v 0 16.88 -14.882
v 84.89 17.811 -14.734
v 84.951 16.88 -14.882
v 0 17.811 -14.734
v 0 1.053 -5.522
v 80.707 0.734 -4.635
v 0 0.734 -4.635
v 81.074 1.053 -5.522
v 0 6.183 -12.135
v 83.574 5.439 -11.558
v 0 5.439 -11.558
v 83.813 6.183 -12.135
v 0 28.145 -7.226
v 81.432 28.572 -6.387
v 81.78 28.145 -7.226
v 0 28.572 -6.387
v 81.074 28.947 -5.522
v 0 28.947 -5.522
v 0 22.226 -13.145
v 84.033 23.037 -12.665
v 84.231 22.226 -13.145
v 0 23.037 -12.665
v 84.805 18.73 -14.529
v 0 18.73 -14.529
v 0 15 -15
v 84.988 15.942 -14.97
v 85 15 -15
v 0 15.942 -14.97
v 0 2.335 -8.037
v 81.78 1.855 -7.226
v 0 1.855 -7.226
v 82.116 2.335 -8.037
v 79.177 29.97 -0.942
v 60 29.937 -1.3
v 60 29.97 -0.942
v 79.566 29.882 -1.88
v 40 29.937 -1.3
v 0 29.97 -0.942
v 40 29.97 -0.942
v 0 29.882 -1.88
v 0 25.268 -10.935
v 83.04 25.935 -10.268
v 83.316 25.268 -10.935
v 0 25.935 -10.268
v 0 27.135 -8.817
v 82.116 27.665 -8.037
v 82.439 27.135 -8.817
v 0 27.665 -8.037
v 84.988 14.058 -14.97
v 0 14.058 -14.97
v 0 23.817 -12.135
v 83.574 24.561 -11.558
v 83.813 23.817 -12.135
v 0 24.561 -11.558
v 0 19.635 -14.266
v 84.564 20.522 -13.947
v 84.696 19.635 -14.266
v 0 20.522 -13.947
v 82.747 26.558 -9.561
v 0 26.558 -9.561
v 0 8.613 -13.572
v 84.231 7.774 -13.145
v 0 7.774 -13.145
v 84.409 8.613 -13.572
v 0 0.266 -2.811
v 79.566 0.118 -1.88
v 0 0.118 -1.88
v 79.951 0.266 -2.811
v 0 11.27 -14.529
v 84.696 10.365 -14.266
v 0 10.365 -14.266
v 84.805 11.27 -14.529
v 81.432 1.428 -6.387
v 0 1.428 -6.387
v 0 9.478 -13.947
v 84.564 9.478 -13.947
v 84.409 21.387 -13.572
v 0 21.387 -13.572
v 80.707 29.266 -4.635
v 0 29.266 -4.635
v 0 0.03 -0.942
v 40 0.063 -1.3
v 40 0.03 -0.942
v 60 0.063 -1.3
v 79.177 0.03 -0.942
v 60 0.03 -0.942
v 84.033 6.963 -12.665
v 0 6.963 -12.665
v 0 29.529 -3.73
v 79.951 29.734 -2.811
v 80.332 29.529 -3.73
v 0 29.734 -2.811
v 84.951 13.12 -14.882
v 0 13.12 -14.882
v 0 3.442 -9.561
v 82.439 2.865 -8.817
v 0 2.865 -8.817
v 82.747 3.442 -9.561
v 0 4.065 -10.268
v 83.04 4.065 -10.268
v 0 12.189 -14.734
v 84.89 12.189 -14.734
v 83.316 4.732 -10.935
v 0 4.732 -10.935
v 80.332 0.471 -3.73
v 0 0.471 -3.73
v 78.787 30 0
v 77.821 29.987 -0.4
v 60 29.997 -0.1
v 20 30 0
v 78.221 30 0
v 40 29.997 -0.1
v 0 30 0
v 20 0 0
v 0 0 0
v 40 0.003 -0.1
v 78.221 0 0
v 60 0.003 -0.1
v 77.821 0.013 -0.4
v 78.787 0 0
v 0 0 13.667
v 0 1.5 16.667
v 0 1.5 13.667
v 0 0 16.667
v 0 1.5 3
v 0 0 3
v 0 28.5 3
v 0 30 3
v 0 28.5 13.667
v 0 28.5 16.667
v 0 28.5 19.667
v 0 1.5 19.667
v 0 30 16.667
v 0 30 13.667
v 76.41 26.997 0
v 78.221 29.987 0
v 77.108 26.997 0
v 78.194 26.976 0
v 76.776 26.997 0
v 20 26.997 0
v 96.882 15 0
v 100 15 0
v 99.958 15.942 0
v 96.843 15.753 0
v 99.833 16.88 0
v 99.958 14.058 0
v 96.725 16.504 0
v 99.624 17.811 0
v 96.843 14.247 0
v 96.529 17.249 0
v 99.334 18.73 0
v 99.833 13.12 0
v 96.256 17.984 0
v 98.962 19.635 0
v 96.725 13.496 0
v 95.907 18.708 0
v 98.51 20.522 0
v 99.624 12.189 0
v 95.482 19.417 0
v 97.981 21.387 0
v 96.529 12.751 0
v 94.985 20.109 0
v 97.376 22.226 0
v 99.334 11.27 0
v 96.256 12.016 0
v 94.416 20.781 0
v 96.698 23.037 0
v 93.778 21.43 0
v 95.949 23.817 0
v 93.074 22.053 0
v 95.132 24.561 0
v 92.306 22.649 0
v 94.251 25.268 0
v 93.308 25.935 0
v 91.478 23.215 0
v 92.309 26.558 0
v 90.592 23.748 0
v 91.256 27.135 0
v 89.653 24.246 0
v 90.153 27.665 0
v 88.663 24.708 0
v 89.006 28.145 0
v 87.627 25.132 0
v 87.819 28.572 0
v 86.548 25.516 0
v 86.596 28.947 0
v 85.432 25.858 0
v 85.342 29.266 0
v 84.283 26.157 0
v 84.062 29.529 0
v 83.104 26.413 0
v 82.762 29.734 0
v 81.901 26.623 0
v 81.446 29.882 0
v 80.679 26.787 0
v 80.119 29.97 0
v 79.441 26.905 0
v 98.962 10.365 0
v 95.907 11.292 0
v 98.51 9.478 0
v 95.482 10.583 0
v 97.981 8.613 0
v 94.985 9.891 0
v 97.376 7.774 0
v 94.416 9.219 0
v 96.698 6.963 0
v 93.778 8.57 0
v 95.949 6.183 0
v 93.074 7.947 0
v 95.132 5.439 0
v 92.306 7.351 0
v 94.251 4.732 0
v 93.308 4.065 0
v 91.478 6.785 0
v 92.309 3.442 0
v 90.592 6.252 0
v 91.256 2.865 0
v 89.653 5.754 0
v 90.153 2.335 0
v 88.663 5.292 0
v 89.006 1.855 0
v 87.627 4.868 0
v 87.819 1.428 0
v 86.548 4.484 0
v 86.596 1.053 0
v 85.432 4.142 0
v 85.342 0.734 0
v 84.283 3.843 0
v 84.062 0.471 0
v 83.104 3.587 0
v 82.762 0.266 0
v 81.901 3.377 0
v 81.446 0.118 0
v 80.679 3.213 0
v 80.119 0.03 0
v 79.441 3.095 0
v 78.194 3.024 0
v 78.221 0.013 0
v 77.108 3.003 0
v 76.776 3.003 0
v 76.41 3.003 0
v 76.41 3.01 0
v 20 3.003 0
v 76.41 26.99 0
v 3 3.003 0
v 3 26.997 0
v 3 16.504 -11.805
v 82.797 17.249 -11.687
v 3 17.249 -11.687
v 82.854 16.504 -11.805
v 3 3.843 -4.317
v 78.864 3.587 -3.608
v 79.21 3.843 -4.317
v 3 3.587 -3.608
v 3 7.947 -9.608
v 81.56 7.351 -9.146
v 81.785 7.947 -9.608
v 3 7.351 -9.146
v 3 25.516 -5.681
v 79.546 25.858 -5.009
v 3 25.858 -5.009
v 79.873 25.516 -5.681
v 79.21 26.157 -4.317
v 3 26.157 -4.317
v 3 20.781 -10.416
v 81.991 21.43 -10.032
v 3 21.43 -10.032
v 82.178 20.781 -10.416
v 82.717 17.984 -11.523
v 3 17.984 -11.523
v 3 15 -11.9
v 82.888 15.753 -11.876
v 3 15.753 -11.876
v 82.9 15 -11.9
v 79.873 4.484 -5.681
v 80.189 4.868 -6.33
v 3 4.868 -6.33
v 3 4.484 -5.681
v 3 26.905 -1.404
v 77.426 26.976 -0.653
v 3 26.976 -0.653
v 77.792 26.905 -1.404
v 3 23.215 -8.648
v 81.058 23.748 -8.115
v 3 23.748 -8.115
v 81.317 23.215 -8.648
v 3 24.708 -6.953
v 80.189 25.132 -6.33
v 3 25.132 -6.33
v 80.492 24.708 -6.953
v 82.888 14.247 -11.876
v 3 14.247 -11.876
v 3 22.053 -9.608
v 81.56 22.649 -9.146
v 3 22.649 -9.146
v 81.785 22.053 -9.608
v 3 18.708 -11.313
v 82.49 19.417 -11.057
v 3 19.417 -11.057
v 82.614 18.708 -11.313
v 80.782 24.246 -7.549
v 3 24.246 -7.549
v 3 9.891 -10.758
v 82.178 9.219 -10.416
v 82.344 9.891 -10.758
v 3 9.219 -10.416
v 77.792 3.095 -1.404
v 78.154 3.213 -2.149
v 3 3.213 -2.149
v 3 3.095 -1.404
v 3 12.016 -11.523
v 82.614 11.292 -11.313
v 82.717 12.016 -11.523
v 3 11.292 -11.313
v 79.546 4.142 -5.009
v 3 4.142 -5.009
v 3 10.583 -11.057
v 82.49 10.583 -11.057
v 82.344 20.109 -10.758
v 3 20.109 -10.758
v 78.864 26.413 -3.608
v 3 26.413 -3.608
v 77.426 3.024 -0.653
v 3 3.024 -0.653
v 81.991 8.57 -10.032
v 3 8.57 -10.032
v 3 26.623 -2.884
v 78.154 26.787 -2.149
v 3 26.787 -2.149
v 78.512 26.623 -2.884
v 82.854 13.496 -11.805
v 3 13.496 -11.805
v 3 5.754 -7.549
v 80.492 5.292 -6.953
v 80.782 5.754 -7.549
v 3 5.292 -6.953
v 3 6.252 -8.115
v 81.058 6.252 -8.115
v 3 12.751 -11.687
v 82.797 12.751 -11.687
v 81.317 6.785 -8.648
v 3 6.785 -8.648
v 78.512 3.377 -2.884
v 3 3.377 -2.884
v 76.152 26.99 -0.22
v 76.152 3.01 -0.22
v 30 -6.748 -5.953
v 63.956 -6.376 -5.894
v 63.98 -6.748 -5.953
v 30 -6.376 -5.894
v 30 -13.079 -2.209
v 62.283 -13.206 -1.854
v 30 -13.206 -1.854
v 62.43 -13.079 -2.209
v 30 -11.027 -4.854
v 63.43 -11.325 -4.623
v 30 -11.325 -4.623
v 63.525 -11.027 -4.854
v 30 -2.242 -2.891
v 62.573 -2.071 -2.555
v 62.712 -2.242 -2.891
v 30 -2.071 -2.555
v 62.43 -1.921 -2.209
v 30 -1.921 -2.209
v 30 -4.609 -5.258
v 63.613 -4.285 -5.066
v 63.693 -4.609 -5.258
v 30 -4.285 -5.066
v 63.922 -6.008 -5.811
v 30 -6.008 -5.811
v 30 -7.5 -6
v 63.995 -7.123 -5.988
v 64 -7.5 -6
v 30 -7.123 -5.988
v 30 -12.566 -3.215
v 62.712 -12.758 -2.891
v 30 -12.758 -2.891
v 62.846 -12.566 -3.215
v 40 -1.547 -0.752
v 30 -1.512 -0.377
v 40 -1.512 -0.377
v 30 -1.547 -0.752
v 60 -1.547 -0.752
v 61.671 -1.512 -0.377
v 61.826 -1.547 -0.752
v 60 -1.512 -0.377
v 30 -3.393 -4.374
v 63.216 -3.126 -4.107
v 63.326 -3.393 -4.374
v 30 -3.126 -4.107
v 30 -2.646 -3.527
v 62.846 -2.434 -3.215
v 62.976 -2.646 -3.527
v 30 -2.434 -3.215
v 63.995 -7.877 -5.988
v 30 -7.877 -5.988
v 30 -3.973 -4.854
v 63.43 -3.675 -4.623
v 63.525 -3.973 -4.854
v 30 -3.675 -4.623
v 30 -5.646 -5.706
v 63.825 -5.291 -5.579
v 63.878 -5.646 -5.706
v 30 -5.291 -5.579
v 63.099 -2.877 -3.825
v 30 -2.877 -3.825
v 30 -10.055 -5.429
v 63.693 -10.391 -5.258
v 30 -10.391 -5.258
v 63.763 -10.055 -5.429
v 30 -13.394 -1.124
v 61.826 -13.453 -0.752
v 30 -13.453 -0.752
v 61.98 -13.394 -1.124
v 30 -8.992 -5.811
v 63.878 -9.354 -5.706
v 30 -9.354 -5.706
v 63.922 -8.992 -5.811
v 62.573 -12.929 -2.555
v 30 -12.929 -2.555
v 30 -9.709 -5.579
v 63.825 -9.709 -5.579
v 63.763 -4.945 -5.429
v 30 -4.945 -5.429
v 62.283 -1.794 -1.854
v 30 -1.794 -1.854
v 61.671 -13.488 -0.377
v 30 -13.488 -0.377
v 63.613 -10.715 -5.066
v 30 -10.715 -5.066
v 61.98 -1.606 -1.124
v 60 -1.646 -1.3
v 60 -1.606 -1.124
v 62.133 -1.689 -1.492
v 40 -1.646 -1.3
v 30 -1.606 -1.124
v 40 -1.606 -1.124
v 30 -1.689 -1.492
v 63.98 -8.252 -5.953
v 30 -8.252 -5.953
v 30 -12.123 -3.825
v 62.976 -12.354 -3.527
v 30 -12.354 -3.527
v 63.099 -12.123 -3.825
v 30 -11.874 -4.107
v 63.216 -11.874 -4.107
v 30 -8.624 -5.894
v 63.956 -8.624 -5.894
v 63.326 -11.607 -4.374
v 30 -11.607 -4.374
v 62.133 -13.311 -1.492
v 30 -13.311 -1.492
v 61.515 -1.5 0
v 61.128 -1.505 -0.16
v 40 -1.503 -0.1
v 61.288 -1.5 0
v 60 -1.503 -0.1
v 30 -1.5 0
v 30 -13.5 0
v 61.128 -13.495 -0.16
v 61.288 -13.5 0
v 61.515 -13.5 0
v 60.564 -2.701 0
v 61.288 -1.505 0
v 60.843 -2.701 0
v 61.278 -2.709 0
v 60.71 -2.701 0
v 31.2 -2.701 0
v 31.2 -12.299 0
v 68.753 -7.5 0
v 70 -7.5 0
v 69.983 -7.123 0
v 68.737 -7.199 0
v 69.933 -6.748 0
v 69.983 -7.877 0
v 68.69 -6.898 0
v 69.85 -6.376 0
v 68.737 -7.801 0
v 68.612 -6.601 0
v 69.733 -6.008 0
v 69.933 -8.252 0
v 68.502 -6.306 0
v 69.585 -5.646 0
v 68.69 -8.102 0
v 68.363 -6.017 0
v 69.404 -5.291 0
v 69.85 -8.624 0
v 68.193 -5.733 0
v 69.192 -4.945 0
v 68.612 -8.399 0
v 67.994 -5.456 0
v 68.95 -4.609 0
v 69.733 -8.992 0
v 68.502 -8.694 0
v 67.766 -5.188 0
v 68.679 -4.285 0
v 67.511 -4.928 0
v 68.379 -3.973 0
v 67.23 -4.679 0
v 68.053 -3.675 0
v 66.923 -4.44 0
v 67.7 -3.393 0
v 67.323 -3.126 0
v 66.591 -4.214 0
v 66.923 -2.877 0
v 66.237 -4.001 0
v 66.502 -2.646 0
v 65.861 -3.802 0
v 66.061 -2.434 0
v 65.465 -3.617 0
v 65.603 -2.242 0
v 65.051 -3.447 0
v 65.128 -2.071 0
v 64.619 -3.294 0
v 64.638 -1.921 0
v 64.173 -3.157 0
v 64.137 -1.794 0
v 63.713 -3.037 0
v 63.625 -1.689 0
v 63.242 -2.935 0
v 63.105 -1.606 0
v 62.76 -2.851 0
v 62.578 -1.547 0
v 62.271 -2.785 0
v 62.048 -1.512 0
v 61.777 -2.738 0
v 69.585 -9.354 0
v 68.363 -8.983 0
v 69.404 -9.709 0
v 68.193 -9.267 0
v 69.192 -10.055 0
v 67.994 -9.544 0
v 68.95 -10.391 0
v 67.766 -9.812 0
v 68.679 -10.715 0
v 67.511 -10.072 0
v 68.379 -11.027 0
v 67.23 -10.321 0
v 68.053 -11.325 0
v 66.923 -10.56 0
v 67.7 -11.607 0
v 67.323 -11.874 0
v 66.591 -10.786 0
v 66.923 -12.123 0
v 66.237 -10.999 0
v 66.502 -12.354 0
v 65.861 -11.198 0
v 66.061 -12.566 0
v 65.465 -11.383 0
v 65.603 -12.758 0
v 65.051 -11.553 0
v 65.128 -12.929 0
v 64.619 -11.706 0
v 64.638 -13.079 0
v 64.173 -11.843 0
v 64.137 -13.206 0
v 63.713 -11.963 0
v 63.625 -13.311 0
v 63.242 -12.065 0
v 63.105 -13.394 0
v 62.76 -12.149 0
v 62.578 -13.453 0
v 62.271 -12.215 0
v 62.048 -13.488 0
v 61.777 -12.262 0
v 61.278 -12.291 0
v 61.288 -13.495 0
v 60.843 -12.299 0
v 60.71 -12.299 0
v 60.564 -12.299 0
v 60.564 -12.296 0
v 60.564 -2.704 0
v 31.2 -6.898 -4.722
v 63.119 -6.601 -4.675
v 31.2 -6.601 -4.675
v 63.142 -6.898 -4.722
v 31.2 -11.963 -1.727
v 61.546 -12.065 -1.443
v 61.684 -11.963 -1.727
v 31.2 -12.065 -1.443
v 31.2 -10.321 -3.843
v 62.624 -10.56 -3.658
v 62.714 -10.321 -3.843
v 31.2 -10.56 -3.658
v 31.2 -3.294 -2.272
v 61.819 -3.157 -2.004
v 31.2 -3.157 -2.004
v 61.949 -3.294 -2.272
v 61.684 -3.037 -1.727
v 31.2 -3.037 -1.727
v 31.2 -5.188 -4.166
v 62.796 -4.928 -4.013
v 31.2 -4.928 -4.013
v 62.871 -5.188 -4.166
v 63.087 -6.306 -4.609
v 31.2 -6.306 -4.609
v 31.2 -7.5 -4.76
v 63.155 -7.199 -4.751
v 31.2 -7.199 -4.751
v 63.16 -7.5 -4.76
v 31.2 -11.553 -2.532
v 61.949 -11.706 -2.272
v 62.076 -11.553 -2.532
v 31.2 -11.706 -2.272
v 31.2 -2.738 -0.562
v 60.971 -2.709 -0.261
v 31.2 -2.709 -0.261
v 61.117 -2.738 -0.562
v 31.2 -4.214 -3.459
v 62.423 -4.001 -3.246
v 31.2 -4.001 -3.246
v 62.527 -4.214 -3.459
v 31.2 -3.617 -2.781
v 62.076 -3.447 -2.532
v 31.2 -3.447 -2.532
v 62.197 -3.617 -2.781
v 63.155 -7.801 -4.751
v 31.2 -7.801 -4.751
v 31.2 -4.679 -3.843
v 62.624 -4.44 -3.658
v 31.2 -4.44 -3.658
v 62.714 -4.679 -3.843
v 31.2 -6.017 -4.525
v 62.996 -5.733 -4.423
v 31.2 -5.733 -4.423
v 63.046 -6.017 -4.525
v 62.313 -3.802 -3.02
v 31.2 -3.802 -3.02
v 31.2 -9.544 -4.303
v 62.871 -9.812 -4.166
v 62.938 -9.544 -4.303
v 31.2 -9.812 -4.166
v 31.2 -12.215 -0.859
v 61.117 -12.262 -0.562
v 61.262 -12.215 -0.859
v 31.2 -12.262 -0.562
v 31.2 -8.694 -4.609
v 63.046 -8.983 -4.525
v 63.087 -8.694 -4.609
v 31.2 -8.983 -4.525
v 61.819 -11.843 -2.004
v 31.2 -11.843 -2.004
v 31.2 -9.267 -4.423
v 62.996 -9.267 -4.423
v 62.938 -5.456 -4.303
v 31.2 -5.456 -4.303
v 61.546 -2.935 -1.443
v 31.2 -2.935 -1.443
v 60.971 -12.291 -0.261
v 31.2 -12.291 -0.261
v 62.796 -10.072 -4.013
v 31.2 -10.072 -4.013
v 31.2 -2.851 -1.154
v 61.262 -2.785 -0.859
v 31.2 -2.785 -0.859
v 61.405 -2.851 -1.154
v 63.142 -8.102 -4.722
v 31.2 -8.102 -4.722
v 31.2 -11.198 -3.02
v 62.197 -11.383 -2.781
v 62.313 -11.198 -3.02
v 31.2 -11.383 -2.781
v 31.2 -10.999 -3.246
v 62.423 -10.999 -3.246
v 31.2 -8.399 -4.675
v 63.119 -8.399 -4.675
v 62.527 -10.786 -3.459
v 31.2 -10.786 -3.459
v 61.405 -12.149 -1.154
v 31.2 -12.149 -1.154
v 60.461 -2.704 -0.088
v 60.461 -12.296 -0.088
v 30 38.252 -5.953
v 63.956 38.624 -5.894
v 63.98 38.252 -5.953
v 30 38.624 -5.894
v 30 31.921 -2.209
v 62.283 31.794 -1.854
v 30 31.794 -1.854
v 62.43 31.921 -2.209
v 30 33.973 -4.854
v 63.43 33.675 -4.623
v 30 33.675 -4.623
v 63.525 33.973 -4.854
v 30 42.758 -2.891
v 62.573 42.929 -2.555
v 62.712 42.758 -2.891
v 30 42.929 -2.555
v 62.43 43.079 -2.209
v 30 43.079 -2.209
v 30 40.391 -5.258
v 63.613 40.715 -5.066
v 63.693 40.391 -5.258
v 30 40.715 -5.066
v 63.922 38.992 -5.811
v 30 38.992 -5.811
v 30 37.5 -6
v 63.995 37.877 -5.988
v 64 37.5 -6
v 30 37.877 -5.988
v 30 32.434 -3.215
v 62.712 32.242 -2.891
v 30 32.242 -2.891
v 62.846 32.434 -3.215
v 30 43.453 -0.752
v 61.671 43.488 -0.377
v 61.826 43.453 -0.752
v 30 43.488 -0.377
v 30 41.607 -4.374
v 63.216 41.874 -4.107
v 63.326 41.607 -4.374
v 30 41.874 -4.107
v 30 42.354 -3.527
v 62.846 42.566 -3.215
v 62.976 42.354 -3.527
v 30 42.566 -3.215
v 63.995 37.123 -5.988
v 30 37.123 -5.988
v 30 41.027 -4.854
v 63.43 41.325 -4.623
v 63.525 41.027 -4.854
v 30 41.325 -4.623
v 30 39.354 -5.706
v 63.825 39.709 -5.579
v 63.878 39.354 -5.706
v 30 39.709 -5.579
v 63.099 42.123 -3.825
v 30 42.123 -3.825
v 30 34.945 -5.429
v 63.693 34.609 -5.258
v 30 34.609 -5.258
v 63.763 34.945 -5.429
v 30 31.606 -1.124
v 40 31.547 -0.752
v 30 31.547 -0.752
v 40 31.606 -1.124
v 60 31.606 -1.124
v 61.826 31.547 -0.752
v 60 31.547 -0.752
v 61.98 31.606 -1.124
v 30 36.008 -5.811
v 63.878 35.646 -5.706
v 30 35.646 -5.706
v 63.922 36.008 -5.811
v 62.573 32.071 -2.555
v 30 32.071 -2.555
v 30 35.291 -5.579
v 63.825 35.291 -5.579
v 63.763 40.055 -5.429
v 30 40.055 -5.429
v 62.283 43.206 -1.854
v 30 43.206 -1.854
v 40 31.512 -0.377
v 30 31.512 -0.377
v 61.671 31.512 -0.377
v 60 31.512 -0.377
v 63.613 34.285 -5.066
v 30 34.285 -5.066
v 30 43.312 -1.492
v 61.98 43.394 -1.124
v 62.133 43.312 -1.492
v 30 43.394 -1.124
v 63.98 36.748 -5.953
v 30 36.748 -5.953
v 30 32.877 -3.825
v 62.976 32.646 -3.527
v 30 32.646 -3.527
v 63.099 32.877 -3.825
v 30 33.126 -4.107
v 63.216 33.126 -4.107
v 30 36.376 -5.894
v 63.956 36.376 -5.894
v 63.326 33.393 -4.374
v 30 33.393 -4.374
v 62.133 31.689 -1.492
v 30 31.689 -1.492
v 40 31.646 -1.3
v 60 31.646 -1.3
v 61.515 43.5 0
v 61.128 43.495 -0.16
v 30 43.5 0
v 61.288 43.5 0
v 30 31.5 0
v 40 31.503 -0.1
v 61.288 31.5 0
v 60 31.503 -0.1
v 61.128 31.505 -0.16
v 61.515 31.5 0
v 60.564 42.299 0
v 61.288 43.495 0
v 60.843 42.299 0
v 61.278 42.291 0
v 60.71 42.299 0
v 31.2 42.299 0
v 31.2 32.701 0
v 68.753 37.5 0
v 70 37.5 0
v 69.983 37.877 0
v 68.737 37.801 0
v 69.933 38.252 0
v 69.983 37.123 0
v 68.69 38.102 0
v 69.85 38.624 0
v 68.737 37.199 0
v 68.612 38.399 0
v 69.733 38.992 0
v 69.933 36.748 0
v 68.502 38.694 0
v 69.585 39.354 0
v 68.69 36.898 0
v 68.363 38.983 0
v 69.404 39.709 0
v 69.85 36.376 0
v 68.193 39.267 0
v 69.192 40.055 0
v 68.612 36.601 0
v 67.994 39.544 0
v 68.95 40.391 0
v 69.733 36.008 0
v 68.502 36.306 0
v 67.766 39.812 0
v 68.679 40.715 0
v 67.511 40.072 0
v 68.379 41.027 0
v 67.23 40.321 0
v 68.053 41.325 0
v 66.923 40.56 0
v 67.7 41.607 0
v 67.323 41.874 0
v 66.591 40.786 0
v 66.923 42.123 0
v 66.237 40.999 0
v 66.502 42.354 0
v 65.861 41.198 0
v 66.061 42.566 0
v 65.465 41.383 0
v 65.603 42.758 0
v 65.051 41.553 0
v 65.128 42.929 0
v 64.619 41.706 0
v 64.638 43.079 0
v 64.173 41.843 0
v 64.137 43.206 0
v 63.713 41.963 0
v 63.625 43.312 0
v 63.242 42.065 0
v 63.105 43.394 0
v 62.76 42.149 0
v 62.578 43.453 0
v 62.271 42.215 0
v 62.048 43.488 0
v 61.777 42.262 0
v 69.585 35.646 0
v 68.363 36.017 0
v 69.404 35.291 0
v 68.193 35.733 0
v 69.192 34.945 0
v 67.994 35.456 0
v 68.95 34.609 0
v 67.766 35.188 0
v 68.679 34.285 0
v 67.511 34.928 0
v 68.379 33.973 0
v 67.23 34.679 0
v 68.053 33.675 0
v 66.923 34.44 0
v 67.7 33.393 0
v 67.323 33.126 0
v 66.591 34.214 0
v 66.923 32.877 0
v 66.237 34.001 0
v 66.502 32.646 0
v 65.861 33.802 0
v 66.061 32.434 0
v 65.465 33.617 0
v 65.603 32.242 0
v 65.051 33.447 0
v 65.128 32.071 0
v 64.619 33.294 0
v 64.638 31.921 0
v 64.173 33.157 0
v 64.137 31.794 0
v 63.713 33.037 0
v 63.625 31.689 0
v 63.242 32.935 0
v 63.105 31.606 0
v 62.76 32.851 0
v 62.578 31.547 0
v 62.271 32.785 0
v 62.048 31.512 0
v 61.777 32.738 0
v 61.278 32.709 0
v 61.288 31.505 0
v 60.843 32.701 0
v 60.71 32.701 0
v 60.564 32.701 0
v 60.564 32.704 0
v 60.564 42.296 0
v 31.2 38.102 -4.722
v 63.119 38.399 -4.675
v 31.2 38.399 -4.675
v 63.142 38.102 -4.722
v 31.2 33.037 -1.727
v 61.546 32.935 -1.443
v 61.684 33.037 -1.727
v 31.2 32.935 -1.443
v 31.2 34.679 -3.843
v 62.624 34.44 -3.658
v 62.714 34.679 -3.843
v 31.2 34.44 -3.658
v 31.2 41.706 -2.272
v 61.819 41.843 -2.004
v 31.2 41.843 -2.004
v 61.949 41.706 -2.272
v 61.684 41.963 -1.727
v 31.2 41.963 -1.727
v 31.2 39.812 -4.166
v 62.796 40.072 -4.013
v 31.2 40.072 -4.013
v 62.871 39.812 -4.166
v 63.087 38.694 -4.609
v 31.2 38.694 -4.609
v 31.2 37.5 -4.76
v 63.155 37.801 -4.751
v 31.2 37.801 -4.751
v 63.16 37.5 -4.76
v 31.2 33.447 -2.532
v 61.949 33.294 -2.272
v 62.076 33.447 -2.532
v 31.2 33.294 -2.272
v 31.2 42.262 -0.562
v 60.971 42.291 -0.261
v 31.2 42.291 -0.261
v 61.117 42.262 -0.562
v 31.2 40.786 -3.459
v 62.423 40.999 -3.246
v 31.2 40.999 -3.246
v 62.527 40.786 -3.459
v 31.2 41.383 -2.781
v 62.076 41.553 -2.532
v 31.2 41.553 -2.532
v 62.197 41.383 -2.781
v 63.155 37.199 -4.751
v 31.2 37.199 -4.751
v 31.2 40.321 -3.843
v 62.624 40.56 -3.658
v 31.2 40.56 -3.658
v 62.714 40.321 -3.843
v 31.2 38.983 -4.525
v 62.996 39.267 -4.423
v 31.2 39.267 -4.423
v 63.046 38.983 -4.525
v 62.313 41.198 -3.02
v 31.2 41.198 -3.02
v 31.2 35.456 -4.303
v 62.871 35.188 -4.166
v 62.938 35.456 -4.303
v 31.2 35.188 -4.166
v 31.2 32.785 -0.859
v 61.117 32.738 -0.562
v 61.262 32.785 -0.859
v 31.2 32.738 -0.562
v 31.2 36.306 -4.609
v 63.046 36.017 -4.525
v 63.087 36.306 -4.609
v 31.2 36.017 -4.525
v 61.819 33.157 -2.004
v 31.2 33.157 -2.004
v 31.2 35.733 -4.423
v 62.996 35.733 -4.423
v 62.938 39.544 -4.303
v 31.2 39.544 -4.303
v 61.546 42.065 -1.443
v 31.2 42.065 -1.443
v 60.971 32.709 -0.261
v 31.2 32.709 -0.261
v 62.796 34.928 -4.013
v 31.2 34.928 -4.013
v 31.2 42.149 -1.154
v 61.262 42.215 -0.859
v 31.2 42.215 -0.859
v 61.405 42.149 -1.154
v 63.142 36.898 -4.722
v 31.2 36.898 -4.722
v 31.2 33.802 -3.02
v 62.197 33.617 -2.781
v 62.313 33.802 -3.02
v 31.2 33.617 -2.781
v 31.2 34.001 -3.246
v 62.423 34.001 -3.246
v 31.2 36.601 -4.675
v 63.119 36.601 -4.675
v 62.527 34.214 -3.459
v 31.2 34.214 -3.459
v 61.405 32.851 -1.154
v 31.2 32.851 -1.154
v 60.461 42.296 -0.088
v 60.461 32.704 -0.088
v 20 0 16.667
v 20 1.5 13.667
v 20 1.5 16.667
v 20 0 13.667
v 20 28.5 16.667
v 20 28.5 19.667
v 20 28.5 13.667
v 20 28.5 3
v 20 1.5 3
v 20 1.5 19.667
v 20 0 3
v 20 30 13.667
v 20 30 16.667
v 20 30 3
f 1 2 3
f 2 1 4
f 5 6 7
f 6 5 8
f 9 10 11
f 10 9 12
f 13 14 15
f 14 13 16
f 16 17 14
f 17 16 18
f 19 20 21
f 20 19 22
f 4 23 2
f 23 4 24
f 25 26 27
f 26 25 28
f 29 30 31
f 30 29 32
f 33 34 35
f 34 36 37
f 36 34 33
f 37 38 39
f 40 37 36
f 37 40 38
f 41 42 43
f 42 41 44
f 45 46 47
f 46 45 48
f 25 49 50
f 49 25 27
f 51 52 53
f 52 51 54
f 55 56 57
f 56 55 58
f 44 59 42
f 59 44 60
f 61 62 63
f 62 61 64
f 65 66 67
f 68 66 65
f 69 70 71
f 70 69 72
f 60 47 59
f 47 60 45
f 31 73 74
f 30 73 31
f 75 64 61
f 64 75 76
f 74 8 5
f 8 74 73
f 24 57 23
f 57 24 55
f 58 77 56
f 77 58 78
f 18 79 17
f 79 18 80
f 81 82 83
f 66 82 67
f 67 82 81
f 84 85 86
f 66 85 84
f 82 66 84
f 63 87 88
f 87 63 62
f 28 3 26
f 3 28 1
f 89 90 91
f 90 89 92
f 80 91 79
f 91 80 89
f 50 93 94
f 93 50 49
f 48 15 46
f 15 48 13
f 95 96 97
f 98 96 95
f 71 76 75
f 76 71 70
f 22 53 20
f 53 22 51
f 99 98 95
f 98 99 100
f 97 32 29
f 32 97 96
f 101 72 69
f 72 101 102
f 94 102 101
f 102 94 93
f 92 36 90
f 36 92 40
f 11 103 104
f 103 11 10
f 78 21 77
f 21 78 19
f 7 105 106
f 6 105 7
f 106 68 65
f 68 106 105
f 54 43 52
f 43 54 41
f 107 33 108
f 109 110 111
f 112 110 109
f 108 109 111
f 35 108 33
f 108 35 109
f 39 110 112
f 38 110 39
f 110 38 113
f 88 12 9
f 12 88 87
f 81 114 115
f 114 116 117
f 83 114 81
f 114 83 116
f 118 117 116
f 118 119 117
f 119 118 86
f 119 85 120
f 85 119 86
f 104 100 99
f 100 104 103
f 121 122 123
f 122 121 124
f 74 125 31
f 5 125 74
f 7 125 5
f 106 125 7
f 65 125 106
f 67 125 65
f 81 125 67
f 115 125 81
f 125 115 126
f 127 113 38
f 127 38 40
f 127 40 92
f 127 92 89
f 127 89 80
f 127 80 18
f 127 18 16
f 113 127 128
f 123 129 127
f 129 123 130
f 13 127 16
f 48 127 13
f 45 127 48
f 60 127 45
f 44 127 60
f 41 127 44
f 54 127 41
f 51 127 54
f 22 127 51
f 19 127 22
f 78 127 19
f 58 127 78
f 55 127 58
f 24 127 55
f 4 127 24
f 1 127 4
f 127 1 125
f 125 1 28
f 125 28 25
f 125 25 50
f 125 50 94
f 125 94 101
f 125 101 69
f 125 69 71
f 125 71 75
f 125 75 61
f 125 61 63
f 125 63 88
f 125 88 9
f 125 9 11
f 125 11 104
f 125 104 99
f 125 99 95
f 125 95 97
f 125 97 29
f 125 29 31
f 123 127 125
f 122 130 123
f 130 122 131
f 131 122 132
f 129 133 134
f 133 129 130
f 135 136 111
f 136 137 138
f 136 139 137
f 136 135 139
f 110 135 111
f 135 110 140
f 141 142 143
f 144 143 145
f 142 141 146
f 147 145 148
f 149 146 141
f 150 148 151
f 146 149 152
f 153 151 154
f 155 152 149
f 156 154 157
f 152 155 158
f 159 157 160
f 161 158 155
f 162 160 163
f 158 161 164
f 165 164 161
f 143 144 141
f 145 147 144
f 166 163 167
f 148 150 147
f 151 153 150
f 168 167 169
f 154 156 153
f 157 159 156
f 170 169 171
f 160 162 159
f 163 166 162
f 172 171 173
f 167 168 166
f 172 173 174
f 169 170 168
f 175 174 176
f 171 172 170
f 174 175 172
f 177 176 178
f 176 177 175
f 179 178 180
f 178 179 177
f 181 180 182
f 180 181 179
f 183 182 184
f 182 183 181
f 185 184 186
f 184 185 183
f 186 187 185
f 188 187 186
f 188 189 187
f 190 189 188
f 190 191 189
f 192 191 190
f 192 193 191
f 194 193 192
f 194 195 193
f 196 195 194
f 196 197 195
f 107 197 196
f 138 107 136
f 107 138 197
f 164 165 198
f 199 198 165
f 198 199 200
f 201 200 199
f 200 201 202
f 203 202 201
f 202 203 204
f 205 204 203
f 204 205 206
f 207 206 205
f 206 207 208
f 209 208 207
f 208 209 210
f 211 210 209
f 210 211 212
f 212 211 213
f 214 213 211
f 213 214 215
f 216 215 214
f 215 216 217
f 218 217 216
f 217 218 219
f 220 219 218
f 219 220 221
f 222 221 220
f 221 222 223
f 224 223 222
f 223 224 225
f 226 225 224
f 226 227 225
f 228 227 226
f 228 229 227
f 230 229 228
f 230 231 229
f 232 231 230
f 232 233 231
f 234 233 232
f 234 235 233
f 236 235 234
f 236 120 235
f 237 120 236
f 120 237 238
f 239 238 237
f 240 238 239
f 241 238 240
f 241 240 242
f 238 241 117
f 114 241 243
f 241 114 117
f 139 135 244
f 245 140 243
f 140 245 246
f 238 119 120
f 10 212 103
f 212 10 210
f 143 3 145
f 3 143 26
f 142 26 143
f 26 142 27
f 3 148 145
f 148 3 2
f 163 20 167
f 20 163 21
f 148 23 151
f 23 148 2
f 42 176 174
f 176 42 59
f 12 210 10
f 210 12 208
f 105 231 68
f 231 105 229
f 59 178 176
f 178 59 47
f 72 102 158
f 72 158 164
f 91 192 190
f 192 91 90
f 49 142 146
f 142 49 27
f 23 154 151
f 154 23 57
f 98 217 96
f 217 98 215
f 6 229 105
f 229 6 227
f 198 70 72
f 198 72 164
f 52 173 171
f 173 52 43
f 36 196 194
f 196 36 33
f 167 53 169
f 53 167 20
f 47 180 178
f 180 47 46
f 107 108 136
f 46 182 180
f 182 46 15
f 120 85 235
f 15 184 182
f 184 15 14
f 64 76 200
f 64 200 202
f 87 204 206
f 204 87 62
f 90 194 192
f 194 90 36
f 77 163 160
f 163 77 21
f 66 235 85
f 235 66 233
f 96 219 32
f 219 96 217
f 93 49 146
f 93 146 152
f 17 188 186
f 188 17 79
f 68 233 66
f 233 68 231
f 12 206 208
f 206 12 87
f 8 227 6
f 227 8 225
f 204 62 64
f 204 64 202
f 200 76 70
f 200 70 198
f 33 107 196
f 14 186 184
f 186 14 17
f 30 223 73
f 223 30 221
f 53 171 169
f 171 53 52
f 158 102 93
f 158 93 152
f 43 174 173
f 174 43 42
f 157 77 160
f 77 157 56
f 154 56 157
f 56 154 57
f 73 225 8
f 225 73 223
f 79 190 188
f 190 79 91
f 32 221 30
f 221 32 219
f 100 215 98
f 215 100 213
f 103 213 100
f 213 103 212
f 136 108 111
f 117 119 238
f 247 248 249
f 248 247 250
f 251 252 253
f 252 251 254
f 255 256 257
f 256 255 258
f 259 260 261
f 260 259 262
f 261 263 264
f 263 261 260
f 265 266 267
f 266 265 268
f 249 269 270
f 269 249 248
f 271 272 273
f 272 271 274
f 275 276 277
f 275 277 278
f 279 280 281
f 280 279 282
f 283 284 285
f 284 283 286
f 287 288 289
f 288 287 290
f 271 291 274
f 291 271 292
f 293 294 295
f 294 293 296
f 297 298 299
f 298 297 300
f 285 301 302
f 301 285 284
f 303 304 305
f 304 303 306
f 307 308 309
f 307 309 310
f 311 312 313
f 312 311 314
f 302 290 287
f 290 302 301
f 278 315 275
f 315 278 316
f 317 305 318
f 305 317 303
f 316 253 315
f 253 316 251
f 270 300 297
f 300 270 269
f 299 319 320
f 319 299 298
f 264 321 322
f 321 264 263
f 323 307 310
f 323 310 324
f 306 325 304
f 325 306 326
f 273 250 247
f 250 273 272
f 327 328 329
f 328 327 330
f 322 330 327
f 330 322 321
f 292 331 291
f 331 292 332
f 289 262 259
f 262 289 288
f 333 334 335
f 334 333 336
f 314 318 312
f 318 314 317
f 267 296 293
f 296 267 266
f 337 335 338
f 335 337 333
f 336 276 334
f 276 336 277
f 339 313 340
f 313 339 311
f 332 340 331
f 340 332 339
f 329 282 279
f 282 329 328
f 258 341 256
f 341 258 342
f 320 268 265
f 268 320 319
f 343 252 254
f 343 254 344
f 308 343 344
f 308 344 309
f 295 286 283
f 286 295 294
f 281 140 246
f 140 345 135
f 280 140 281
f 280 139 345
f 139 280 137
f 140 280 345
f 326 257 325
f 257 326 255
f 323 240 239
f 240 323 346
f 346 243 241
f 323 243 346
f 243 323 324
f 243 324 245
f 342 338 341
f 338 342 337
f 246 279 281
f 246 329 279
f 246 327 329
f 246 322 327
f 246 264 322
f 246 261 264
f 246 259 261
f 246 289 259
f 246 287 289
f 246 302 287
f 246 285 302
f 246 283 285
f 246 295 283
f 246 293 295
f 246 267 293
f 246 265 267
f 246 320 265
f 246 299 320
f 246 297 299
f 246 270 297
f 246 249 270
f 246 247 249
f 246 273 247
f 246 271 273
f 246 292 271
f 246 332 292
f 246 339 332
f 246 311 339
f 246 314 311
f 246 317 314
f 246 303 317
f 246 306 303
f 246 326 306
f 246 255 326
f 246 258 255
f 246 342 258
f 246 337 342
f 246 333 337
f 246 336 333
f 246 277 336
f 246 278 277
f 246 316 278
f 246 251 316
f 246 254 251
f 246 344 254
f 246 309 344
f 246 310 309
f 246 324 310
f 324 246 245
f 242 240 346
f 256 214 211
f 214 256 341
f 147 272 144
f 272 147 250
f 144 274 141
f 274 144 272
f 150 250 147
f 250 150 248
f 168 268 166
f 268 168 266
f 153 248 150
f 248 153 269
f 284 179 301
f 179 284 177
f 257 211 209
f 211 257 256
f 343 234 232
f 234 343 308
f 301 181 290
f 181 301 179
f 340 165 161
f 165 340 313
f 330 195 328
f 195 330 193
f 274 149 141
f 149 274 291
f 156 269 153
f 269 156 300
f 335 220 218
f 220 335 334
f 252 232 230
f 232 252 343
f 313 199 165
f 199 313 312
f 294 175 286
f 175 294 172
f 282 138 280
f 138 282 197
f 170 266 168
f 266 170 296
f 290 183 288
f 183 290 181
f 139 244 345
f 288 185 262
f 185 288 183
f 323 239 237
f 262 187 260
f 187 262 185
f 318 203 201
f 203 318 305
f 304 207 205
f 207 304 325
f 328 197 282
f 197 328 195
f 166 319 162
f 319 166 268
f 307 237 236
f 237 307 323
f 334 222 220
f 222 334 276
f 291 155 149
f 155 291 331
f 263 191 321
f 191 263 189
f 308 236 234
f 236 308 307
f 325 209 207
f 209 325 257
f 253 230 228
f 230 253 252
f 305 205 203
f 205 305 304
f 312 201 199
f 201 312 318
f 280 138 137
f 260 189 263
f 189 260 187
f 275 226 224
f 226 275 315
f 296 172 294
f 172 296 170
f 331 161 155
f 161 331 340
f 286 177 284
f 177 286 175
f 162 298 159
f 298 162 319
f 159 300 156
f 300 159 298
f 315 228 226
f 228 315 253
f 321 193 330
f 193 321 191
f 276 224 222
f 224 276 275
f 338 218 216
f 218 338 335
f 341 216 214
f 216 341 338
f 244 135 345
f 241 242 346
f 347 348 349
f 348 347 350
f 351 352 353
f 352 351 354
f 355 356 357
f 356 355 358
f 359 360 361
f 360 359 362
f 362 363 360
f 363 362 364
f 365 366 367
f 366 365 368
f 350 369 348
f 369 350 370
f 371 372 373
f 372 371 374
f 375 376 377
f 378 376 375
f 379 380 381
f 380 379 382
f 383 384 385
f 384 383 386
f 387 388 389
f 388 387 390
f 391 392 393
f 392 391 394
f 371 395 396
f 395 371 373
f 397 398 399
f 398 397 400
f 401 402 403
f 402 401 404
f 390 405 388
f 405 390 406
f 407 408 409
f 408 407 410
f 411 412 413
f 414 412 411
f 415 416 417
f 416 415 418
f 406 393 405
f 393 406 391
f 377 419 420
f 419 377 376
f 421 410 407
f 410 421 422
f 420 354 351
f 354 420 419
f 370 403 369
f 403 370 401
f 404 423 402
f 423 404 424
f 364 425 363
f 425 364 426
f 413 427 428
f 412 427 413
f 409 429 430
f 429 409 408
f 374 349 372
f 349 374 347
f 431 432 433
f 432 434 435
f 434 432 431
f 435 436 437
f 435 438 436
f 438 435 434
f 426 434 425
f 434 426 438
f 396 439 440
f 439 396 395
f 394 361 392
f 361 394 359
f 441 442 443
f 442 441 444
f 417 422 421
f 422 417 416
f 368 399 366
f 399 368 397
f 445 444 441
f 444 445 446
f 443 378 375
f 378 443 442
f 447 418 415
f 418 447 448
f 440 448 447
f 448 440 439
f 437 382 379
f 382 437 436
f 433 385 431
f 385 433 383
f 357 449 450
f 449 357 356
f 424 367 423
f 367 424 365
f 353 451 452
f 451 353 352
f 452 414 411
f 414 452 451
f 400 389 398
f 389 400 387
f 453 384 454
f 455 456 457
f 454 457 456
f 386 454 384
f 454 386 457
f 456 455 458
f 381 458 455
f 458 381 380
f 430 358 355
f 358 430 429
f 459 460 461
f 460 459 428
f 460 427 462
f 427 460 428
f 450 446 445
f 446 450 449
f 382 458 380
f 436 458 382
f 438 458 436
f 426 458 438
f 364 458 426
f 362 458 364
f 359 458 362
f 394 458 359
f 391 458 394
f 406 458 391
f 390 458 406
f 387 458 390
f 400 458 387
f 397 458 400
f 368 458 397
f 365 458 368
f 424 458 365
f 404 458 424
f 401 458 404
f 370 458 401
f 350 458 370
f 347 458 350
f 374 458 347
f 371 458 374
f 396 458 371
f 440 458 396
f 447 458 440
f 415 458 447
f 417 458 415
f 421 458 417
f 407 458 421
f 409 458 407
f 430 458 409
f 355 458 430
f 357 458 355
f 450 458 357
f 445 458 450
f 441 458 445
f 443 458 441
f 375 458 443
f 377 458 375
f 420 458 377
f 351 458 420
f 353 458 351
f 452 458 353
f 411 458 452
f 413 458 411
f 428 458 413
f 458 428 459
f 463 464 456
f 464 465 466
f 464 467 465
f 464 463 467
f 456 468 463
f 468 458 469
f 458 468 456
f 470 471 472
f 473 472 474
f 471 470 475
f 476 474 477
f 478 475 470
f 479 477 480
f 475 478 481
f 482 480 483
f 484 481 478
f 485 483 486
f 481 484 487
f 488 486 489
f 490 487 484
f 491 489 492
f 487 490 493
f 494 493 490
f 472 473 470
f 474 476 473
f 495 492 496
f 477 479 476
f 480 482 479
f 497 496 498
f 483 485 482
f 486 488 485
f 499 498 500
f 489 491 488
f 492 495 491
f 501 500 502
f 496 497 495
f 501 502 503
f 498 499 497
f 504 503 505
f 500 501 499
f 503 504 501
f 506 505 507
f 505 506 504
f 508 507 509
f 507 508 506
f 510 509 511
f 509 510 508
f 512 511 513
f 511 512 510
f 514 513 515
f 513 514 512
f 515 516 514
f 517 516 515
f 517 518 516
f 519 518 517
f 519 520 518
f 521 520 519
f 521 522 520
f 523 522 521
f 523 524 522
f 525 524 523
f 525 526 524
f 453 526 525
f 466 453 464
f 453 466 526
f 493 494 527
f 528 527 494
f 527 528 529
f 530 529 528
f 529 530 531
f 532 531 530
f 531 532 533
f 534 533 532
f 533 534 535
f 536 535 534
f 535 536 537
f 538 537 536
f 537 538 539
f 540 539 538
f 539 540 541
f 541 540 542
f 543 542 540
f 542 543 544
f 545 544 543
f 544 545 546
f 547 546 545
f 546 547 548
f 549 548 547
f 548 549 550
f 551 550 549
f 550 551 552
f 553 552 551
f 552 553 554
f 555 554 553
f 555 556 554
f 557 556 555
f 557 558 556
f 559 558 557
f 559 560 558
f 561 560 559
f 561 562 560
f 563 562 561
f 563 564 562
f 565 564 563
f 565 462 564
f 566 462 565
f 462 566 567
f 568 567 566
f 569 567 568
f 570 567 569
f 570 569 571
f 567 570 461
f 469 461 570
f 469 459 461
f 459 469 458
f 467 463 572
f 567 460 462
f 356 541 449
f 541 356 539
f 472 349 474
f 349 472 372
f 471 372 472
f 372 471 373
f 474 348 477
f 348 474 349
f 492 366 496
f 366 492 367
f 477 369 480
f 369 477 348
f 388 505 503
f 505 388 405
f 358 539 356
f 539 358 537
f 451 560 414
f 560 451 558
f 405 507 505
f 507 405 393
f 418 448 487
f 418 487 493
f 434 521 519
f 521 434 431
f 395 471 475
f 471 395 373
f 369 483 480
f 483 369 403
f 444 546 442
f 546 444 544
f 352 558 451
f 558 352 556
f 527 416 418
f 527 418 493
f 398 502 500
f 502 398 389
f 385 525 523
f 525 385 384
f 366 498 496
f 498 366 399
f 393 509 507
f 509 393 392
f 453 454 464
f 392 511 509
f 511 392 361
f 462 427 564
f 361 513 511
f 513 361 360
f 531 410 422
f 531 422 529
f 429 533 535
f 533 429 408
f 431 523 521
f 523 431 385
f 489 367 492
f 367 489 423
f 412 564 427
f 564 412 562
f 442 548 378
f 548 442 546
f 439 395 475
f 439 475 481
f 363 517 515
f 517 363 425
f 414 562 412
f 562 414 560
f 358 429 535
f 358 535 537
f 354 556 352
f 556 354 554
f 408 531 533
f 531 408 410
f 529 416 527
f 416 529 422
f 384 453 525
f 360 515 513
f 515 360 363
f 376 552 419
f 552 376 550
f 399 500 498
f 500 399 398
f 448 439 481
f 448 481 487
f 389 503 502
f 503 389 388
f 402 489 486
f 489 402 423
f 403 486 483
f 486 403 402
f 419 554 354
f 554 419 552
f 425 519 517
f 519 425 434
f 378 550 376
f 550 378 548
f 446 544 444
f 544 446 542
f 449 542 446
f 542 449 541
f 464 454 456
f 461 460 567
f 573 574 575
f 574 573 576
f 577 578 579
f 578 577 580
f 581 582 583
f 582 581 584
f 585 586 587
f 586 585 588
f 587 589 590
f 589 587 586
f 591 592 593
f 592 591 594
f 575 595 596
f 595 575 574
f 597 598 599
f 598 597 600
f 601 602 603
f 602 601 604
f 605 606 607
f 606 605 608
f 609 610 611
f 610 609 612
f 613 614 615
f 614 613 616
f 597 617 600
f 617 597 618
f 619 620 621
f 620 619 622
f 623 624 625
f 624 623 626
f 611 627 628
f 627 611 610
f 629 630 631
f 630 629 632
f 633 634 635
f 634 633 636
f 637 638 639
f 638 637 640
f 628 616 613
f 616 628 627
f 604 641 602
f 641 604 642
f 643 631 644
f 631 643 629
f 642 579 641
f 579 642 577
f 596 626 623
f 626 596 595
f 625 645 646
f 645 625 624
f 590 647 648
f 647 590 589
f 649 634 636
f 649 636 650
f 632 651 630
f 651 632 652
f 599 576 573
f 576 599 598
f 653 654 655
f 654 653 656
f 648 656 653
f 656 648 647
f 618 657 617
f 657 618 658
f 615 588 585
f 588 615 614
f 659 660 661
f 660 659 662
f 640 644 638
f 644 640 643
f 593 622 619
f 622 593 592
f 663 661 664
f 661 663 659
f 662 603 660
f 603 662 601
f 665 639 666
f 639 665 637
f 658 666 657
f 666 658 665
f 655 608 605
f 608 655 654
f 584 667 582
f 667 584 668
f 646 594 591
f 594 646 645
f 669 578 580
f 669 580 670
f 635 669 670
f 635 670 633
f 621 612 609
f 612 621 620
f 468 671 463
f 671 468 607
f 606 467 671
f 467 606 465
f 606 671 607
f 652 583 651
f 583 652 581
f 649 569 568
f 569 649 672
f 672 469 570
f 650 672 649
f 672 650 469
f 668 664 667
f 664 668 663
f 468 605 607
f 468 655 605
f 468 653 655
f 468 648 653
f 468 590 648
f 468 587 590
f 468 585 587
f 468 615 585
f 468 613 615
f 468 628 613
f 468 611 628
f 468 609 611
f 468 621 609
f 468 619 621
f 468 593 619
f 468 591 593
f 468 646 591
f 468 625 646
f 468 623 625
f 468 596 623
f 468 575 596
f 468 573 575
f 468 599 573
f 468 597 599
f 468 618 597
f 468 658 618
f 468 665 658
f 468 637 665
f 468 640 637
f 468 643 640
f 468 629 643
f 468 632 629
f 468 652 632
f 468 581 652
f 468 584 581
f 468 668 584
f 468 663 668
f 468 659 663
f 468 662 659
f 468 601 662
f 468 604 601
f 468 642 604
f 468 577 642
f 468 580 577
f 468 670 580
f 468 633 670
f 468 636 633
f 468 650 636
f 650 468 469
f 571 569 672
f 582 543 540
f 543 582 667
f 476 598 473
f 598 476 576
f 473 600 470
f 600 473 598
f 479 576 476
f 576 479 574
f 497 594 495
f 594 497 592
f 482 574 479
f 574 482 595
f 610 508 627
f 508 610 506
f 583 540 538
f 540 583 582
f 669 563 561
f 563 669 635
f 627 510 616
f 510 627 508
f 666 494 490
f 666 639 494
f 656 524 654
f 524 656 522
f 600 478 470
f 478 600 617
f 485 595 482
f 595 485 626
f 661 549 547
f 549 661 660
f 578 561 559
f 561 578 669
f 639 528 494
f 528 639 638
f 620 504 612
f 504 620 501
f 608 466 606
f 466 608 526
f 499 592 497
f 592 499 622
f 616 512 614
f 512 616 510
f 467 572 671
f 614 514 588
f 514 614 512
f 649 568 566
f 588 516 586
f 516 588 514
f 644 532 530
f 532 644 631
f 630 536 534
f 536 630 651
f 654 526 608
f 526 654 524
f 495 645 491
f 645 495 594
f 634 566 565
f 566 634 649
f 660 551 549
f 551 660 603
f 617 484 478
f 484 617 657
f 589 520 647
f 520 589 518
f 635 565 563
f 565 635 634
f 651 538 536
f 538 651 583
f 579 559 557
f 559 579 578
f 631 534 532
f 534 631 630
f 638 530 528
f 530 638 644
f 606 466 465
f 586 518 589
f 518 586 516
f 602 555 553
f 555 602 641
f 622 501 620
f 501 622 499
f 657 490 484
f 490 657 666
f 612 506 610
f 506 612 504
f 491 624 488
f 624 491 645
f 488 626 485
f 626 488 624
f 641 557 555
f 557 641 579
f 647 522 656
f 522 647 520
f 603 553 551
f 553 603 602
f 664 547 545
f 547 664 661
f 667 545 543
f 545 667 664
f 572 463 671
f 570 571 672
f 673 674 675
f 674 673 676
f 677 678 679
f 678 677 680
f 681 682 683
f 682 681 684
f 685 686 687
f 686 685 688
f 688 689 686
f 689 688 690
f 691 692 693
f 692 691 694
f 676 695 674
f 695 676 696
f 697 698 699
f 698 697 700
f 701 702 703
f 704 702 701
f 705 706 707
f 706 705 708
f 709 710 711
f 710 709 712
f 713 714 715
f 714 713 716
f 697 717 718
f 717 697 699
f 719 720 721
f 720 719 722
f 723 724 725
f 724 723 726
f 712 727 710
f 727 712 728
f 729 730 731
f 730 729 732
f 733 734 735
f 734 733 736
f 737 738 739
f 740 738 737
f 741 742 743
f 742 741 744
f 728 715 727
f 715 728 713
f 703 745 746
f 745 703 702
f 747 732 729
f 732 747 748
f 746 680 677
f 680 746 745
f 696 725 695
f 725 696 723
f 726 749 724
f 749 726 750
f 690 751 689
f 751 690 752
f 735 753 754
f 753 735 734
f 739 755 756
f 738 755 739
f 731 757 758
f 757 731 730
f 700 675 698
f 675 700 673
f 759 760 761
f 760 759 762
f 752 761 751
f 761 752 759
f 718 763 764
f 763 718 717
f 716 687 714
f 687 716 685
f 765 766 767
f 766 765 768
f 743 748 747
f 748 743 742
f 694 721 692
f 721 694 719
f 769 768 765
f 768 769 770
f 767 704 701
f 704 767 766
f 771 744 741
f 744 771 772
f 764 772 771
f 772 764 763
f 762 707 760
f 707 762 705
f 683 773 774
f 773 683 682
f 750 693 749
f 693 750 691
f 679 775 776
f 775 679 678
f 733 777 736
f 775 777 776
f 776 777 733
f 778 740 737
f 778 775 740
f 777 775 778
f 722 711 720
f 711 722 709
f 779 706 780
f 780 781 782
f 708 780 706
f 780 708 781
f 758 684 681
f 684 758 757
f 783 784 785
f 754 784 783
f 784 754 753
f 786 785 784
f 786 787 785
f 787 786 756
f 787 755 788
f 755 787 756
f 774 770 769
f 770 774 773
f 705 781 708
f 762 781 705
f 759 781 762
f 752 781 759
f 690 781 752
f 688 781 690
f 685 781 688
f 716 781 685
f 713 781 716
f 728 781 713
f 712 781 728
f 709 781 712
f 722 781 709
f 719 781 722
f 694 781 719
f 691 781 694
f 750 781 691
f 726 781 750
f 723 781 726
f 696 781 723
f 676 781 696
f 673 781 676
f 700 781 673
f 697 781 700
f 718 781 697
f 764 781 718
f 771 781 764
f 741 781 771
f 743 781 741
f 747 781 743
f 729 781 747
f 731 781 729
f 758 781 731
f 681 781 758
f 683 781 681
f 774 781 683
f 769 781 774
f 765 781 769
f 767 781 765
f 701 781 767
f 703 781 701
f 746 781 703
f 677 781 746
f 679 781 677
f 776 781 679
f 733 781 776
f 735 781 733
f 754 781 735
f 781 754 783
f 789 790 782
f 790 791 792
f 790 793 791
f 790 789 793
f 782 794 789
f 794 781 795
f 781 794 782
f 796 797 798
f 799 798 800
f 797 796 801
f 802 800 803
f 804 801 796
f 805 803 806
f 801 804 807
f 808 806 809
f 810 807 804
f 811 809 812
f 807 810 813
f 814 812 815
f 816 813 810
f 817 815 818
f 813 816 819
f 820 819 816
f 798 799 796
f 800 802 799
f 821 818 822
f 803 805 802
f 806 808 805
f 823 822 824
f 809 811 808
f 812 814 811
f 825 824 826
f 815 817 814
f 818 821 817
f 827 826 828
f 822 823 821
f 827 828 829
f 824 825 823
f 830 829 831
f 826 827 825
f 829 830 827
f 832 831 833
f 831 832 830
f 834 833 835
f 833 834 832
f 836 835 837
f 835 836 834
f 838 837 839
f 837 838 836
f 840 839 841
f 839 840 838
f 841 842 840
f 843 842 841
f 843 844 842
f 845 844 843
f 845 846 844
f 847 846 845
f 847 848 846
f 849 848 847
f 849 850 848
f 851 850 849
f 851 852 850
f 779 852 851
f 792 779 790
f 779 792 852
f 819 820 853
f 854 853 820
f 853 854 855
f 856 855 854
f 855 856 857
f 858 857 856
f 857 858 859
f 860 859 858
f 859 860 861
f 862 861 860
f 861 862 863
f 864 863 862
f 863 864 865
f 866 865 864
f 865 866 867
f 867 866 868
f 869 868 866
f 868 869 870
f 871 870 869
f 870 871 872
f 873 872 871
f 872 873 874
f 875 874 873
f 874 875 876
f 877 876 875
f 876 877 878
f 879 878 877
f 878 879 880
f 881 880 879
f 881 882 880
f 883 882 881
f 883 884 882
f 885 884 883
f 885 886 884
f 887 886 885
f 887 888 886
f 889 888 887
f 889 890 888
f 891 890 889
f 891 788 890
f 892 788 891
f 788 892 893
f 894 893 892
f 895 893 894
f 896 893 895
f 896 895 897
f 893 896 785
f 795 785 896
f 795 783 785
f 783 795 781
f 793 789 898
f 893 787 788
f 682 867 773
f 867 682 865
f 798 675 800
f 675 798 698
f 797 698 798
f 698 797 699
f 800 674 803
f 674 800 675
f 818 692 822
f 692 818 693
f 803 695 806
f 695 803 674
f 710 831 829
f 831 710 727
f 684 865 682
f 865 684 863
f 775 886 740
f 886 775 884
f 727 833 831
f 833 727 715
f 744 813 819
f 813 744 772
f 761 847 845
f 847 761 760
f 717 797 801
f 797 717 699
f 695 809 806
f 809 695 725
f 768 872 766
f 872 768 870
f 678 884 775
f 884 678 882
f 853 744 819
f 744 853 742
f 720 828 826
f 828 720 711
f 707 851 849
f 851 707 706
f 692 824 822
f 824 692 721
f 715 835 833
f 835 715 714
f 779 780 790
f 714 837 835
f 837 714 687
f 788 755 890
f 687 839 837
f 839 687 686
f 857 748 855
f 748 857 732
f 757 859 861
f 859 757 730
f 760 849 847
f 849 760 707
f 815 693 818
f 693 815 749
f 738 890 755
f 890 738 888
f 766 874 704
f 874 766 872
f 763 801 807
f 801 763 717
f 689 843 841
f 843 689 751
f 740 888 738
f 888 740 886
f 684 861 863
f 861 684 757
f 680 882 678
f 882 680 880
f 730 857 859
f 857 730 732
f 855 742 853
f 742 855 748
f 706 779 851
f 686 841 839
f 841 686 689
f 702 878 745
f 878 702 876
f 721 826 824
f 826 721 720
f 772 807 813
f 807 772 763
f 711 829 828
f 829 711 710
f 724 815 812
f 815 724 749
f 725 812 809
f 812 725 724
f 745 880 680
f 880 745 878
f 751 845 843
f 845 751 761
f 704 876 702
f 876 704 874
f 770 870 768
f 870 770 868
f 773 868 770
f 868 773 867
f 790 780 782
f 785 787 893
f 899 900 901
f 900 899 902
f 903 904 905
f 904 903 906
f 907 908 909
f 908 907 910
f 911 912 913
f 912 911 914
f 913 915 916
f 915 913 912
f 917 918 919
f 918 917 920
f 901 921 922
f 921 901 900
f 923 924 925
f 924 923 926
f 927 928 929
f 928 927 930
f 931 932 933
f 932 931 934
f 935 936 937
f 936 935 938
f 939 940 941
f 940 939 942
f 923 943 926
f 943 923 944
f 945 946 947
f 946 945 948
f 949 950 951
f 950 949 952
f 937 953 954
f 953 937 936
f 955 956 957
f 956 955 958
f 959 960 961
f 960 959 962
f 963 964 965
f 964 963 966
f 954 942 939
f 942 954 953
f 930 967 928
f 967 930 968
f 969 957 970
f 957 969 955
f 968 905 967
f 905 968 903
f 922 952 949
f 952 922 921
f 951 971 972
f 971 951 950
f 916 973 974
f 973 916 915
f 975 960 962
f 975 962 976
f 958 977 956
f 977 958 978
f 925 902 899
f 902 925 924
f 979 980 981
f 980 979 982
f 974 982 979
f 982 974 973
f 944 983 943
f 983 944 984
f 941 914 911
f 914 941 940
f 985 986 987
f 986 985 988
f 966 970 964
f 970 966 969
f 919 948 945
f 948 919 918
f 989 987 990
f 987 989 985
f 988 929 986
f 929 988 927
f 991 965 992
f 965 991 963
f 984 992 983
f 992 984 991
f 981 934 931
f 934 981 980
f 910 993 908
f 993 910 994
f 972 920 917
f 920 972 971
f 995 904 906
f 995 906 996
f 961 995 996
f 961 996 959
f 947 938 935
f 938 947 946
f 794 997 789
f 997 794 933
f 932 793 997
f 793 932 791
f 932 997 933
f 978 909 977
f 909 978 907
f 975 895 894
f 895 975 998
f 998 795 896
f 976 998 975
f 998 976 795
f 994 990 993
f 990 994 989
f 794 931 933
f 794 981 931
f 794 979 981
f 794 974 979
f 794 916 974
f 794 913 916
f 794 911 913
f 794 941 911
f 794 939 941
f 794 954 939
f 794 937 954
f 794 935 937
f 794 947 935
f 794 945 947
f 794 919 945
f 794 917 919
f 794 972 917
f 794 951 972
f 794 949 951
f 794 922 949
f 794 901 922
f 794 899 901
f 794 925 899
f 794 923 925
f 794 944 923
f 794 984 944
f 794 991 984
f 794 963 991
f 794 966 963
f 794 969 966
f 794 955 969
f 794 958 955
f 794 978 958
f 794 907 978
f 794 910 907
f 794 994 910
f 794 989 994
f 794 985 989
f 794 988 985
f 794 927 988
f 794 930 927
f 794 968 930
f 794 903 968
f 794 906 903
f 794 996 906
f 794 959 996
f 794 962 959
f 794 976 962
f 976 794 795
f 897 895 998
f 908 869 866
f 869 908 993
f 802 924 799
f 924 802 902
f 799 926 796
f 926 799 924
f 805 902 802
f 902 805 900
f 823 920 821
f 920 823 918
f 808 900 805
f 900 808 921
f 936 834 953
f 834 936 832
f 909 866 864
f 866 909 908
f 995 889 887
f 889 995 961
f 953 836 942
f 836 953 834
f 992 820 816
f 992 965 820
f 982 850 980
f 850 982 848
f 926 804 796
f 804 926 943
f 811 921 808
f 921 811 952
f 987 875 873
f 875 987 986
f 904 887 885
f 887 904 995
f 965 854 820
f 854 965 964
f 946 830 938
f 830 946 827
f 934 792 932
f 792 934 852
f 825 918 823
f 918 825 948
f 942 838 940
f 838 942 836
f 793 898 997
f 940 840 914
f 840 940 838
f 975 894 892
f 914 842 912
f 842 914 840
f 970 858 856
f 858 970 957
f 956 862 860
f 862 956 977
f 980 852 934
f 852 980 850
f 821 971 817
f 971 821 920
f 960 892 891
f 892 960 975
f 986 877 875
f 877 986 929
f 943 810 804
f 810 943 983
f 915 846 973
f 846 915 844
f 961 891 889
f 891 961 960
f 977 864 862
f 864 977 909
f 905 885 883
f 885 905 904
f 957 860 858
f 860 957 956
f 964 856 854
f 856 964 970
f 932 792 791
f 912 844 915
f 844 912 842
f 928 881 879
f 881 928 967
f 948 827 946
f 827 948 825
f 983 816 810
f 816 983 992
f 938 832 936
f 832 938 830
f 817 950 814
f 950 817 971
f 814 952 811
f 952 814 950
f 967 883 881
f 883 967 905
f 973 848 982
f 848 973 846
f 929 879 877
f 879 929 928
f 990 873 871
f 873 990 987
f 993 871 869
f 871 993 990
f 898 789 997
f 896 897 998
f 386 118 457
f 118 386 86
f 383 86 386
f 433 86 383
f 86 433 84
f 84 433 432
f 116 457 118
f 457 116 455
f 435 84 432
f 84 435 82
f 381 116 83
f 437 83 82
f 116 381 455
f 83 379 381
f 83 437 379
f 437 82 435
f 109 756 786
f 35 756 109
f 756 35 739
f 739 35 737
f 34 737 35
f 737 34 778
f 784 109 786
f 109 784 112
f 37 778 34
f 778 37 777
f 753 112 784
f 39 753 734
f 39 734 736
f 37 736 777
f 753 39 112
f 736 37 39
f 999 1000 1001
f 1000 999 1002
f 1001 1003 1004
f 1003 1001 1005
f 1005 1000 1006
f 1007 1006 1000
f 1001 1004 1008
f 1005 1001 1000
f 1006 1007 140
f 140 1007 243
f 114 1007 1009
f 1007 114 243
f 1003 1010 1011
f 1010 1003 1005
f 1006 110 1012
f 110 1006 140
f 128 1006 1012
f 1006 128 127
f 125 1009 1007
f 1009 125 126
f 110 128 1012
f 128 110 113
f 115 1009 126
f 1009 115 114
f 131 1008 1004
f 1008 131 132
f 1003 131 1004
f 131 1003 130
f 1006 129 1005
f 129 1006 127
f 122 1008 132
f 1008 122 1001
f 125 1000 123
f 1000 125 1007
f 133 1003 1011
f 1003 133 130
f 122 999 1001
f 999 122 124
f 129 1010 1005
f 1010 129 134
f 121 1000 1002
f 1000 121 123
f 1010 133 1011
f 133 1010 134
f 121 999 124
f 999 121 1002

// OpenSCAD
length=100;
width=30;
front_angle=45;//[0:89]
wall=3;
jolly_boat_scale=0.4; //[0:0.01:0.49]
Cargo_Ship_Addon="Yes"; //[Yes, No]

/* [Hidden] */
fn=100;
eps=0.1;

complete_boat();
jolly_boat();
if (Cargo_Ship_Addon=="Yes")
{
    cargo();
}

module jolly_boat()
{
    //starboard
    translate([length/2,-width/4,0])
    scale(jolly_boat_scale)
    translate([-length/2,-width/2,0])
        complete_boat();
    
    //larboard
    translate([length/2,width+width/4,0])
    scale(jolly_boat_scale)
    translate([-length/2,-width/2,0])
        complete_boat();
    if (jolly_boat_scale<0.5)
    {
    //Bridge starboard
    translate([length/2-(length/2*jolly_boat_scale)/2,-width/4+width/2*jolly_boat_scale-jolly_boat_scale*wall+wall*jolly_boat_scale/2,-wall*jolly_boat_scale-eps])
    cube([length/2*jolly_boat_scale,width/4+jolly_boat_scale*(wall-width/2),wall*jolly_boat_scale]);
    
    //Brdige larboard
    translate([length/2-(length/2*jolly_boat_scale)/2,width-wall*jolly_boat_scale/2,-wall*jolly_boat_scale-eps])
    cube([length/2*jolly_boat_scale,width/4+jolly_boat_scale*(wall-width/2),wall*jolly_boat_scale]);
    }
}

module cargo()
{
cube([length/5,width,wall]);
translate([0,width/2-width*9/10/2,wall])
    cube([length/5,width*9/10,length/6]);
translate([0,0,length/6-wall])
cube([length/5,width,wall]);
}

module complete_boat()
{
difference()
{
boat();
 translate([wall,wall,eps])
    scale([(length-2*wall)/length,(width-2*wall)/width,(width/2-wall)/(width/2)])
boat();
}
}


module boat()
{
    difference()
{
    difference()
{
    rotate([0,90,0])
    translate([0,width/2,0])
    cylinder(h=length,r=width/2,center=false,$fn=fn);
    translate([-eps,-eps,0])
    cube([length+2*eps,width+2*eps,width/2],center=false);
}

difference()
{
translate([length-(sqrt(pow(width/2,2)+pow(width/2*tan(front_angle),2))+(width/2)/tan(front_angle))-eps,0,-width/2-eps])
cube([sqrt(pow(width/2,2)+pow(width/2*tan(front_angle),2))+(width/2)/tan(front_angle)+2*eps,width+2*eps,width/2+2*eps],center=false);
translate([length,width/2,0])
rotate([0,front_angle,0])
translate([-width/2,0,-(width/2*tan(front_angle)+sqrt(pow(width/2,2)+pow((width/2)/tan(front_angle),2)))-2*eps])
    {
cylinder(h=width/2*tan(front_angle)+sqrt(pow(width/2,2)+pow((width/2)/tan(front_angle),2))+4*eps,r=width/2,$fn=fn);
translate([-(width/2*tan(front_angle)+sqrt(pow(width/2,2)+pow((width/2)/tan(front_angle),2)))-2*eps,-width/2-eps,])
cube([(width/2*tan(front_angle)+sqrt(pow(width/2,2)+pow((width/2)/tan(front_angle),2)))-2*eps,width+4*eps,width/2*tan(front_angle)+sqrt(pow(width/2,2)+pow((width/2)/tan(front_angle),2))+4*eps]);
    }
}
}
}
